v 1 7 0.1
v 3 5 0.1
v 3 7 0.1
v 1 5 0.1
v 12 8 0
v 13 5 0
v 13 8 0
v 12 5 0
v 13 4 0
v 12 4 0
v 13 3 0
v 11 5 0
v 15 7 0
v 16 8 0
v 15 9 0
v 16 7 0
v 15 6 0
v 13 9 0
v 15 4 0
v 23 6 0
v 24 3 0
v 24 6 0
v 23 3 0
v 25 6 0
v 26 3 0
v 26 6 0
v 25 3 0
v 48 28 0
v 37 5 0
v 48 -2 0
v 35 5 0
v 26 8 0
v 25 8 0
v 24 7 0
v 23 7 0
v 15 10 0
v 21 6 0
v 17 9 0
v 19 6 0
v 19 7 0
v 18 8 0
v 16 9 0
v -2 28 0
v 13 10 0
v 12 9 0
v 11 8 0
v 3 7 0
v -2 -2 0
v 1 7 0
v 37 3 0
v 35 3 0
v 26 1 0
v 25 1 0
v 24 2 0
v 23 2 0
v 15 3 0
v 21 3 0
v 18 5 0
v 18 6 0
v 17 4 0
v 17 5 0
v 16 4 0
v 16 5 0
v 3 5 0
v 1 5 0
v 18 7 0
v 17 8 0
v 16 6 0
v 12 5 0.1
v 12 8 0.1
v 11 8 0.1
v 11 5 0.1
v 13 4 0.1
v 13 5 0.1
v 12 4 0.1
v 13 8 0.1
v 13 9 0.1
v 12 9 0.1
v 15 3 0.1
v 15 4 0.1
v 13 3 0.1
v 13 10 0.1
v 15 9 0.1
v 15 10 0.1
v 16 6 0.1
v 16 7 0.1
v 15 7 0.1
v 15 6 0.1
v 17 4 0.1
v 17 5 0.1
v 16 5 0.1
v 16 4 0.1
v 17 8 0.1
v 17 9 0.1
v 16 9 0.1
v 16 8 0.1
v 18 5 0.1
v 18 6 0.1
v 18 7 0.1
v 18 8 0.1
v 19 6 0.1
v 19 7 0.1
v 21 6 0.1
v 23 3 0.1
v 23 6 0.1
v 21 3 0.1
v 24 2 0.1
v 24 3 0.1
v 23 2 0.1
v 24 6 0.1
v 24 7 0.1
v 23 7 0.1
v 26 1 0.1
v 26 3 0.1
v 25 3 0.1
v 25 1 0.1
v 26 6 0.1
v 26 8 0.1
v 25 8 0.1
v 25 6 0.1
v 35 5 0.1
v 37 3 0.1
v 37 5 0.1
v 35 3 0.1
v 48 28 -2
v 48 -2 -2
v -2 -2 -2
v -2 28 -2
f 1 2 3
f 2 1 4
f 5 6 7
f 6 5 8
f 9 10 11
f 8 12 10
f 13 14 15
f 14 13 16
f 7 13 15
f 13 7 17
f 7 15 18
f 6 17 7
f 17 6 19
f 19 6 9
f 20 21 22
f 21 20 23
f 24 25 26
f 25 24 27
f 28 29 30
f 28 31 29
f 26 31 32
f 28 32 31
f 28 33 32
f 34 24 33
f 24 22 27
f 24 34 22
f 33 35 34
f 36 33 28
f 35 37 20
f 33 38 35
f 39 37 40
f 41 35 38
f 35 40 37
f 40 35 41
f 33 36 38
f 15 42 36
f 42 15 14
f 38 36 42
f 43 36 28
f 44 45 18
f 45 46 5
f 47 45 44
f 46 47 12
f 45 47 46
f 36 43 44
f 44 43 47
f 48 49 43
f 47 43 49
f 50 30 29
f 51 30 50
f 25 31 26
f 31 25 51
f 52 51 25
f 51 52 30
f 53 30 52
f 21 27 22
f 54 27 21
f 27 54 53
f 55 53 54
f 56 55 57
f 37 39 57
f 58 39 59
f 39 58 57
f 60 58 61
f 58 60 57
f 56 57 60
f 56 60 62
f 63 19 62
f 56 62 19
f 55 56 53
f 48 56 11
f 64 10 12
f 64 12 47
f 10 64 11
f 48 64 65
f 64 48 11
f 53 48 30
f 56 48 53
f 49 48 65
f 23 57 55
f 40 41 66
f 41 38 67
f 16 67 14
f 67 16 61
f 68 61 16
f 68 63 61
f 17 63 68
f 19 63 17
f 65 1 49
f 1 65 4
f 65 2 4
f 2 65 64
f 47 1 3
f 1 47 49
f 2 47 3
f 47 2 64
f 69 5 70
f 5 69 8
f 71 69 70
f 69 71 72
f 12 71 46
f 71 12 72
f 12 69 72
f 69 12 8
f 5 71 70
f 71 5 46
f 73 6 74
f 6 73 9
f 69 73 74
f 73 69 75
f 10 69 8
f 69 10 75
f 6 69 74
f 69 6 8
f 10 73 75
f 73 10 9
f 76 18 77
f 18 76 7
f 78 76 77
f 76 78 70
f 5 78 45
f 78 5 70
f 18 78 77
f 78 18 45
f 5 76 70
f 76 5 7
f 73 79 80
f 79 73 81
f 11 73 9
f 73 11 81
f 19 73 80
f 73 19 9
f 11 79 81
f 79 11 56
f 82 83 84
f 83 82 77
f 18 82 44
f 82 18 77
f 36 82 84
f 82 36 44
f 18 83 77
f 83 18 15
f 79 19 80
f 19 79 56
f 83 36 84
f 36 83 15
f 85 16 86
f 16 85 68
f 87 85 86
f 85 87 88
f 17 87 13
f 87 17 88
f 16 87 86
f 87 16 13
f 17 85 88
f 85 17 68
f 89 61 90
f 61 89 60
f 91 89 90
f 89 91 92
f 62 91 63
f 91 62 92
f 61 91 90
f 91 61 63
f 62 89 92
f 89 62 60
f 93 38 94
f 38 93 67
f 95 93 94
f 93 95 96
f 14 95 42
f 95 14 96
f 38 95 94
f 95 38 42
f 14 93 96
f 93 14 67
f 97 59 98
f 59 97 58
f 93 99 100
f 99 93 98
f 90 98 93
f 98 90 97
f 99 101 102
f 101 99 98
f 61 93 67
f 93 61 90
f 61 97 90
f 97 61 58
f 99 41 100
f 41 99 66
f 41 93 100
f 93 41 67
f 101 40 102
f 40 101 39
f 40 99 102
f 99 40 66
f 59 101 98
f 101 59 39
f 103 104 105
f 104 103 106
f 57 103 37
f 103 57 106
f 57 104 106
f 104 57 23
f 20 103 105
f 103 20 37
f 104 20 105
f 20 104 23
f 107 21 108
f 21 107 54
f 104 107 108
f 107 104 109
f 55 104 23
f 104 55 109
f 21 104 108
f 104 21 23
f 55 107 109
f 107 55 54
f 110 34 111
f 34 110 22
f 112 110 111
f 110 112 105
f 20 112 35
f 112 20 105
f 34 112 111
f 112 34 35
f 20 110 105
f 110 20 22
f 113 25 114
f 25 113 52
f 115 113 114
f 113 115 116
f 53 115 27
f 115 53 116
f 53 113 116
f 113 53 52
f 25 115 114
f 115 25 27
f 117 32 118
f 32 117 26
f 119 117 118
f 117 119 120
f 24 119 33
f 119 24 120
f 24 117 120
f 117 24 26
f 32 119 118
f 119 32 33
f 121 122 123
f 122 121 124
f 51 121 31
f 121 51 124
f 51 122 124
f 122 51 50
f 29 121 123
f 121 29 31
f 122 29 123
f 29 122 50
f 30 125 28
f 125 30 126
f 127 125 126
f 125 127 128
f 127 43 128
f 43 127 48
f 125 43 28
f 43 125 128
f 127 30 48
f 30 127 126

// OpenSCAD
// Definiert eine Zelle in der Game of Life-Welt
module cell(x, y) {
    translate([x, y, 0])
        cube([1, 1, 0.1]);
}

// Definiert die Struktur der Gosper's Gleiterkanone
module gliderGun() {
    // Koordinaten der aktiven Zellen
    active_cells = [
        [1, 5], [1, 6], [2, 5], [2, 6], [11, 5], [11, 6], [11, 7],
        [12, 4], [12, 8], [13, 3], [13, 9], [14, 3], [14, 9],
        [15, 6], [16, 4], [16, 8], [17, 5], [17, 6], [17, 7],
        [18, 6], [21, 3], [21, 4], [21, 5], [22, 3], [22, 4], [22, 5],
        [23, 2], [23, 6], [25, 1], [25, 2], [25, 6], [25, 7],
        [35, 3], [35, 4], [36, 3], [36, 4]
    ];

    // Erstellt jede aktive Zelle
    for (pos = active_cells) {
        cell(pos[0], pos[1]);
    }
}

// Basisplatte
module basePlate(width, height, thickness) {
    translate([-2, -2, -thickness])
        cube([width, height, thickness]);
}

// Erstellt die gesamte Szene
module gliderGunOnBase() {
    basePlate(50, 30, 2);  // Größe der Basisplatte
    gliderGun();
}

// Render die Szene
gliderGunOnBase();
